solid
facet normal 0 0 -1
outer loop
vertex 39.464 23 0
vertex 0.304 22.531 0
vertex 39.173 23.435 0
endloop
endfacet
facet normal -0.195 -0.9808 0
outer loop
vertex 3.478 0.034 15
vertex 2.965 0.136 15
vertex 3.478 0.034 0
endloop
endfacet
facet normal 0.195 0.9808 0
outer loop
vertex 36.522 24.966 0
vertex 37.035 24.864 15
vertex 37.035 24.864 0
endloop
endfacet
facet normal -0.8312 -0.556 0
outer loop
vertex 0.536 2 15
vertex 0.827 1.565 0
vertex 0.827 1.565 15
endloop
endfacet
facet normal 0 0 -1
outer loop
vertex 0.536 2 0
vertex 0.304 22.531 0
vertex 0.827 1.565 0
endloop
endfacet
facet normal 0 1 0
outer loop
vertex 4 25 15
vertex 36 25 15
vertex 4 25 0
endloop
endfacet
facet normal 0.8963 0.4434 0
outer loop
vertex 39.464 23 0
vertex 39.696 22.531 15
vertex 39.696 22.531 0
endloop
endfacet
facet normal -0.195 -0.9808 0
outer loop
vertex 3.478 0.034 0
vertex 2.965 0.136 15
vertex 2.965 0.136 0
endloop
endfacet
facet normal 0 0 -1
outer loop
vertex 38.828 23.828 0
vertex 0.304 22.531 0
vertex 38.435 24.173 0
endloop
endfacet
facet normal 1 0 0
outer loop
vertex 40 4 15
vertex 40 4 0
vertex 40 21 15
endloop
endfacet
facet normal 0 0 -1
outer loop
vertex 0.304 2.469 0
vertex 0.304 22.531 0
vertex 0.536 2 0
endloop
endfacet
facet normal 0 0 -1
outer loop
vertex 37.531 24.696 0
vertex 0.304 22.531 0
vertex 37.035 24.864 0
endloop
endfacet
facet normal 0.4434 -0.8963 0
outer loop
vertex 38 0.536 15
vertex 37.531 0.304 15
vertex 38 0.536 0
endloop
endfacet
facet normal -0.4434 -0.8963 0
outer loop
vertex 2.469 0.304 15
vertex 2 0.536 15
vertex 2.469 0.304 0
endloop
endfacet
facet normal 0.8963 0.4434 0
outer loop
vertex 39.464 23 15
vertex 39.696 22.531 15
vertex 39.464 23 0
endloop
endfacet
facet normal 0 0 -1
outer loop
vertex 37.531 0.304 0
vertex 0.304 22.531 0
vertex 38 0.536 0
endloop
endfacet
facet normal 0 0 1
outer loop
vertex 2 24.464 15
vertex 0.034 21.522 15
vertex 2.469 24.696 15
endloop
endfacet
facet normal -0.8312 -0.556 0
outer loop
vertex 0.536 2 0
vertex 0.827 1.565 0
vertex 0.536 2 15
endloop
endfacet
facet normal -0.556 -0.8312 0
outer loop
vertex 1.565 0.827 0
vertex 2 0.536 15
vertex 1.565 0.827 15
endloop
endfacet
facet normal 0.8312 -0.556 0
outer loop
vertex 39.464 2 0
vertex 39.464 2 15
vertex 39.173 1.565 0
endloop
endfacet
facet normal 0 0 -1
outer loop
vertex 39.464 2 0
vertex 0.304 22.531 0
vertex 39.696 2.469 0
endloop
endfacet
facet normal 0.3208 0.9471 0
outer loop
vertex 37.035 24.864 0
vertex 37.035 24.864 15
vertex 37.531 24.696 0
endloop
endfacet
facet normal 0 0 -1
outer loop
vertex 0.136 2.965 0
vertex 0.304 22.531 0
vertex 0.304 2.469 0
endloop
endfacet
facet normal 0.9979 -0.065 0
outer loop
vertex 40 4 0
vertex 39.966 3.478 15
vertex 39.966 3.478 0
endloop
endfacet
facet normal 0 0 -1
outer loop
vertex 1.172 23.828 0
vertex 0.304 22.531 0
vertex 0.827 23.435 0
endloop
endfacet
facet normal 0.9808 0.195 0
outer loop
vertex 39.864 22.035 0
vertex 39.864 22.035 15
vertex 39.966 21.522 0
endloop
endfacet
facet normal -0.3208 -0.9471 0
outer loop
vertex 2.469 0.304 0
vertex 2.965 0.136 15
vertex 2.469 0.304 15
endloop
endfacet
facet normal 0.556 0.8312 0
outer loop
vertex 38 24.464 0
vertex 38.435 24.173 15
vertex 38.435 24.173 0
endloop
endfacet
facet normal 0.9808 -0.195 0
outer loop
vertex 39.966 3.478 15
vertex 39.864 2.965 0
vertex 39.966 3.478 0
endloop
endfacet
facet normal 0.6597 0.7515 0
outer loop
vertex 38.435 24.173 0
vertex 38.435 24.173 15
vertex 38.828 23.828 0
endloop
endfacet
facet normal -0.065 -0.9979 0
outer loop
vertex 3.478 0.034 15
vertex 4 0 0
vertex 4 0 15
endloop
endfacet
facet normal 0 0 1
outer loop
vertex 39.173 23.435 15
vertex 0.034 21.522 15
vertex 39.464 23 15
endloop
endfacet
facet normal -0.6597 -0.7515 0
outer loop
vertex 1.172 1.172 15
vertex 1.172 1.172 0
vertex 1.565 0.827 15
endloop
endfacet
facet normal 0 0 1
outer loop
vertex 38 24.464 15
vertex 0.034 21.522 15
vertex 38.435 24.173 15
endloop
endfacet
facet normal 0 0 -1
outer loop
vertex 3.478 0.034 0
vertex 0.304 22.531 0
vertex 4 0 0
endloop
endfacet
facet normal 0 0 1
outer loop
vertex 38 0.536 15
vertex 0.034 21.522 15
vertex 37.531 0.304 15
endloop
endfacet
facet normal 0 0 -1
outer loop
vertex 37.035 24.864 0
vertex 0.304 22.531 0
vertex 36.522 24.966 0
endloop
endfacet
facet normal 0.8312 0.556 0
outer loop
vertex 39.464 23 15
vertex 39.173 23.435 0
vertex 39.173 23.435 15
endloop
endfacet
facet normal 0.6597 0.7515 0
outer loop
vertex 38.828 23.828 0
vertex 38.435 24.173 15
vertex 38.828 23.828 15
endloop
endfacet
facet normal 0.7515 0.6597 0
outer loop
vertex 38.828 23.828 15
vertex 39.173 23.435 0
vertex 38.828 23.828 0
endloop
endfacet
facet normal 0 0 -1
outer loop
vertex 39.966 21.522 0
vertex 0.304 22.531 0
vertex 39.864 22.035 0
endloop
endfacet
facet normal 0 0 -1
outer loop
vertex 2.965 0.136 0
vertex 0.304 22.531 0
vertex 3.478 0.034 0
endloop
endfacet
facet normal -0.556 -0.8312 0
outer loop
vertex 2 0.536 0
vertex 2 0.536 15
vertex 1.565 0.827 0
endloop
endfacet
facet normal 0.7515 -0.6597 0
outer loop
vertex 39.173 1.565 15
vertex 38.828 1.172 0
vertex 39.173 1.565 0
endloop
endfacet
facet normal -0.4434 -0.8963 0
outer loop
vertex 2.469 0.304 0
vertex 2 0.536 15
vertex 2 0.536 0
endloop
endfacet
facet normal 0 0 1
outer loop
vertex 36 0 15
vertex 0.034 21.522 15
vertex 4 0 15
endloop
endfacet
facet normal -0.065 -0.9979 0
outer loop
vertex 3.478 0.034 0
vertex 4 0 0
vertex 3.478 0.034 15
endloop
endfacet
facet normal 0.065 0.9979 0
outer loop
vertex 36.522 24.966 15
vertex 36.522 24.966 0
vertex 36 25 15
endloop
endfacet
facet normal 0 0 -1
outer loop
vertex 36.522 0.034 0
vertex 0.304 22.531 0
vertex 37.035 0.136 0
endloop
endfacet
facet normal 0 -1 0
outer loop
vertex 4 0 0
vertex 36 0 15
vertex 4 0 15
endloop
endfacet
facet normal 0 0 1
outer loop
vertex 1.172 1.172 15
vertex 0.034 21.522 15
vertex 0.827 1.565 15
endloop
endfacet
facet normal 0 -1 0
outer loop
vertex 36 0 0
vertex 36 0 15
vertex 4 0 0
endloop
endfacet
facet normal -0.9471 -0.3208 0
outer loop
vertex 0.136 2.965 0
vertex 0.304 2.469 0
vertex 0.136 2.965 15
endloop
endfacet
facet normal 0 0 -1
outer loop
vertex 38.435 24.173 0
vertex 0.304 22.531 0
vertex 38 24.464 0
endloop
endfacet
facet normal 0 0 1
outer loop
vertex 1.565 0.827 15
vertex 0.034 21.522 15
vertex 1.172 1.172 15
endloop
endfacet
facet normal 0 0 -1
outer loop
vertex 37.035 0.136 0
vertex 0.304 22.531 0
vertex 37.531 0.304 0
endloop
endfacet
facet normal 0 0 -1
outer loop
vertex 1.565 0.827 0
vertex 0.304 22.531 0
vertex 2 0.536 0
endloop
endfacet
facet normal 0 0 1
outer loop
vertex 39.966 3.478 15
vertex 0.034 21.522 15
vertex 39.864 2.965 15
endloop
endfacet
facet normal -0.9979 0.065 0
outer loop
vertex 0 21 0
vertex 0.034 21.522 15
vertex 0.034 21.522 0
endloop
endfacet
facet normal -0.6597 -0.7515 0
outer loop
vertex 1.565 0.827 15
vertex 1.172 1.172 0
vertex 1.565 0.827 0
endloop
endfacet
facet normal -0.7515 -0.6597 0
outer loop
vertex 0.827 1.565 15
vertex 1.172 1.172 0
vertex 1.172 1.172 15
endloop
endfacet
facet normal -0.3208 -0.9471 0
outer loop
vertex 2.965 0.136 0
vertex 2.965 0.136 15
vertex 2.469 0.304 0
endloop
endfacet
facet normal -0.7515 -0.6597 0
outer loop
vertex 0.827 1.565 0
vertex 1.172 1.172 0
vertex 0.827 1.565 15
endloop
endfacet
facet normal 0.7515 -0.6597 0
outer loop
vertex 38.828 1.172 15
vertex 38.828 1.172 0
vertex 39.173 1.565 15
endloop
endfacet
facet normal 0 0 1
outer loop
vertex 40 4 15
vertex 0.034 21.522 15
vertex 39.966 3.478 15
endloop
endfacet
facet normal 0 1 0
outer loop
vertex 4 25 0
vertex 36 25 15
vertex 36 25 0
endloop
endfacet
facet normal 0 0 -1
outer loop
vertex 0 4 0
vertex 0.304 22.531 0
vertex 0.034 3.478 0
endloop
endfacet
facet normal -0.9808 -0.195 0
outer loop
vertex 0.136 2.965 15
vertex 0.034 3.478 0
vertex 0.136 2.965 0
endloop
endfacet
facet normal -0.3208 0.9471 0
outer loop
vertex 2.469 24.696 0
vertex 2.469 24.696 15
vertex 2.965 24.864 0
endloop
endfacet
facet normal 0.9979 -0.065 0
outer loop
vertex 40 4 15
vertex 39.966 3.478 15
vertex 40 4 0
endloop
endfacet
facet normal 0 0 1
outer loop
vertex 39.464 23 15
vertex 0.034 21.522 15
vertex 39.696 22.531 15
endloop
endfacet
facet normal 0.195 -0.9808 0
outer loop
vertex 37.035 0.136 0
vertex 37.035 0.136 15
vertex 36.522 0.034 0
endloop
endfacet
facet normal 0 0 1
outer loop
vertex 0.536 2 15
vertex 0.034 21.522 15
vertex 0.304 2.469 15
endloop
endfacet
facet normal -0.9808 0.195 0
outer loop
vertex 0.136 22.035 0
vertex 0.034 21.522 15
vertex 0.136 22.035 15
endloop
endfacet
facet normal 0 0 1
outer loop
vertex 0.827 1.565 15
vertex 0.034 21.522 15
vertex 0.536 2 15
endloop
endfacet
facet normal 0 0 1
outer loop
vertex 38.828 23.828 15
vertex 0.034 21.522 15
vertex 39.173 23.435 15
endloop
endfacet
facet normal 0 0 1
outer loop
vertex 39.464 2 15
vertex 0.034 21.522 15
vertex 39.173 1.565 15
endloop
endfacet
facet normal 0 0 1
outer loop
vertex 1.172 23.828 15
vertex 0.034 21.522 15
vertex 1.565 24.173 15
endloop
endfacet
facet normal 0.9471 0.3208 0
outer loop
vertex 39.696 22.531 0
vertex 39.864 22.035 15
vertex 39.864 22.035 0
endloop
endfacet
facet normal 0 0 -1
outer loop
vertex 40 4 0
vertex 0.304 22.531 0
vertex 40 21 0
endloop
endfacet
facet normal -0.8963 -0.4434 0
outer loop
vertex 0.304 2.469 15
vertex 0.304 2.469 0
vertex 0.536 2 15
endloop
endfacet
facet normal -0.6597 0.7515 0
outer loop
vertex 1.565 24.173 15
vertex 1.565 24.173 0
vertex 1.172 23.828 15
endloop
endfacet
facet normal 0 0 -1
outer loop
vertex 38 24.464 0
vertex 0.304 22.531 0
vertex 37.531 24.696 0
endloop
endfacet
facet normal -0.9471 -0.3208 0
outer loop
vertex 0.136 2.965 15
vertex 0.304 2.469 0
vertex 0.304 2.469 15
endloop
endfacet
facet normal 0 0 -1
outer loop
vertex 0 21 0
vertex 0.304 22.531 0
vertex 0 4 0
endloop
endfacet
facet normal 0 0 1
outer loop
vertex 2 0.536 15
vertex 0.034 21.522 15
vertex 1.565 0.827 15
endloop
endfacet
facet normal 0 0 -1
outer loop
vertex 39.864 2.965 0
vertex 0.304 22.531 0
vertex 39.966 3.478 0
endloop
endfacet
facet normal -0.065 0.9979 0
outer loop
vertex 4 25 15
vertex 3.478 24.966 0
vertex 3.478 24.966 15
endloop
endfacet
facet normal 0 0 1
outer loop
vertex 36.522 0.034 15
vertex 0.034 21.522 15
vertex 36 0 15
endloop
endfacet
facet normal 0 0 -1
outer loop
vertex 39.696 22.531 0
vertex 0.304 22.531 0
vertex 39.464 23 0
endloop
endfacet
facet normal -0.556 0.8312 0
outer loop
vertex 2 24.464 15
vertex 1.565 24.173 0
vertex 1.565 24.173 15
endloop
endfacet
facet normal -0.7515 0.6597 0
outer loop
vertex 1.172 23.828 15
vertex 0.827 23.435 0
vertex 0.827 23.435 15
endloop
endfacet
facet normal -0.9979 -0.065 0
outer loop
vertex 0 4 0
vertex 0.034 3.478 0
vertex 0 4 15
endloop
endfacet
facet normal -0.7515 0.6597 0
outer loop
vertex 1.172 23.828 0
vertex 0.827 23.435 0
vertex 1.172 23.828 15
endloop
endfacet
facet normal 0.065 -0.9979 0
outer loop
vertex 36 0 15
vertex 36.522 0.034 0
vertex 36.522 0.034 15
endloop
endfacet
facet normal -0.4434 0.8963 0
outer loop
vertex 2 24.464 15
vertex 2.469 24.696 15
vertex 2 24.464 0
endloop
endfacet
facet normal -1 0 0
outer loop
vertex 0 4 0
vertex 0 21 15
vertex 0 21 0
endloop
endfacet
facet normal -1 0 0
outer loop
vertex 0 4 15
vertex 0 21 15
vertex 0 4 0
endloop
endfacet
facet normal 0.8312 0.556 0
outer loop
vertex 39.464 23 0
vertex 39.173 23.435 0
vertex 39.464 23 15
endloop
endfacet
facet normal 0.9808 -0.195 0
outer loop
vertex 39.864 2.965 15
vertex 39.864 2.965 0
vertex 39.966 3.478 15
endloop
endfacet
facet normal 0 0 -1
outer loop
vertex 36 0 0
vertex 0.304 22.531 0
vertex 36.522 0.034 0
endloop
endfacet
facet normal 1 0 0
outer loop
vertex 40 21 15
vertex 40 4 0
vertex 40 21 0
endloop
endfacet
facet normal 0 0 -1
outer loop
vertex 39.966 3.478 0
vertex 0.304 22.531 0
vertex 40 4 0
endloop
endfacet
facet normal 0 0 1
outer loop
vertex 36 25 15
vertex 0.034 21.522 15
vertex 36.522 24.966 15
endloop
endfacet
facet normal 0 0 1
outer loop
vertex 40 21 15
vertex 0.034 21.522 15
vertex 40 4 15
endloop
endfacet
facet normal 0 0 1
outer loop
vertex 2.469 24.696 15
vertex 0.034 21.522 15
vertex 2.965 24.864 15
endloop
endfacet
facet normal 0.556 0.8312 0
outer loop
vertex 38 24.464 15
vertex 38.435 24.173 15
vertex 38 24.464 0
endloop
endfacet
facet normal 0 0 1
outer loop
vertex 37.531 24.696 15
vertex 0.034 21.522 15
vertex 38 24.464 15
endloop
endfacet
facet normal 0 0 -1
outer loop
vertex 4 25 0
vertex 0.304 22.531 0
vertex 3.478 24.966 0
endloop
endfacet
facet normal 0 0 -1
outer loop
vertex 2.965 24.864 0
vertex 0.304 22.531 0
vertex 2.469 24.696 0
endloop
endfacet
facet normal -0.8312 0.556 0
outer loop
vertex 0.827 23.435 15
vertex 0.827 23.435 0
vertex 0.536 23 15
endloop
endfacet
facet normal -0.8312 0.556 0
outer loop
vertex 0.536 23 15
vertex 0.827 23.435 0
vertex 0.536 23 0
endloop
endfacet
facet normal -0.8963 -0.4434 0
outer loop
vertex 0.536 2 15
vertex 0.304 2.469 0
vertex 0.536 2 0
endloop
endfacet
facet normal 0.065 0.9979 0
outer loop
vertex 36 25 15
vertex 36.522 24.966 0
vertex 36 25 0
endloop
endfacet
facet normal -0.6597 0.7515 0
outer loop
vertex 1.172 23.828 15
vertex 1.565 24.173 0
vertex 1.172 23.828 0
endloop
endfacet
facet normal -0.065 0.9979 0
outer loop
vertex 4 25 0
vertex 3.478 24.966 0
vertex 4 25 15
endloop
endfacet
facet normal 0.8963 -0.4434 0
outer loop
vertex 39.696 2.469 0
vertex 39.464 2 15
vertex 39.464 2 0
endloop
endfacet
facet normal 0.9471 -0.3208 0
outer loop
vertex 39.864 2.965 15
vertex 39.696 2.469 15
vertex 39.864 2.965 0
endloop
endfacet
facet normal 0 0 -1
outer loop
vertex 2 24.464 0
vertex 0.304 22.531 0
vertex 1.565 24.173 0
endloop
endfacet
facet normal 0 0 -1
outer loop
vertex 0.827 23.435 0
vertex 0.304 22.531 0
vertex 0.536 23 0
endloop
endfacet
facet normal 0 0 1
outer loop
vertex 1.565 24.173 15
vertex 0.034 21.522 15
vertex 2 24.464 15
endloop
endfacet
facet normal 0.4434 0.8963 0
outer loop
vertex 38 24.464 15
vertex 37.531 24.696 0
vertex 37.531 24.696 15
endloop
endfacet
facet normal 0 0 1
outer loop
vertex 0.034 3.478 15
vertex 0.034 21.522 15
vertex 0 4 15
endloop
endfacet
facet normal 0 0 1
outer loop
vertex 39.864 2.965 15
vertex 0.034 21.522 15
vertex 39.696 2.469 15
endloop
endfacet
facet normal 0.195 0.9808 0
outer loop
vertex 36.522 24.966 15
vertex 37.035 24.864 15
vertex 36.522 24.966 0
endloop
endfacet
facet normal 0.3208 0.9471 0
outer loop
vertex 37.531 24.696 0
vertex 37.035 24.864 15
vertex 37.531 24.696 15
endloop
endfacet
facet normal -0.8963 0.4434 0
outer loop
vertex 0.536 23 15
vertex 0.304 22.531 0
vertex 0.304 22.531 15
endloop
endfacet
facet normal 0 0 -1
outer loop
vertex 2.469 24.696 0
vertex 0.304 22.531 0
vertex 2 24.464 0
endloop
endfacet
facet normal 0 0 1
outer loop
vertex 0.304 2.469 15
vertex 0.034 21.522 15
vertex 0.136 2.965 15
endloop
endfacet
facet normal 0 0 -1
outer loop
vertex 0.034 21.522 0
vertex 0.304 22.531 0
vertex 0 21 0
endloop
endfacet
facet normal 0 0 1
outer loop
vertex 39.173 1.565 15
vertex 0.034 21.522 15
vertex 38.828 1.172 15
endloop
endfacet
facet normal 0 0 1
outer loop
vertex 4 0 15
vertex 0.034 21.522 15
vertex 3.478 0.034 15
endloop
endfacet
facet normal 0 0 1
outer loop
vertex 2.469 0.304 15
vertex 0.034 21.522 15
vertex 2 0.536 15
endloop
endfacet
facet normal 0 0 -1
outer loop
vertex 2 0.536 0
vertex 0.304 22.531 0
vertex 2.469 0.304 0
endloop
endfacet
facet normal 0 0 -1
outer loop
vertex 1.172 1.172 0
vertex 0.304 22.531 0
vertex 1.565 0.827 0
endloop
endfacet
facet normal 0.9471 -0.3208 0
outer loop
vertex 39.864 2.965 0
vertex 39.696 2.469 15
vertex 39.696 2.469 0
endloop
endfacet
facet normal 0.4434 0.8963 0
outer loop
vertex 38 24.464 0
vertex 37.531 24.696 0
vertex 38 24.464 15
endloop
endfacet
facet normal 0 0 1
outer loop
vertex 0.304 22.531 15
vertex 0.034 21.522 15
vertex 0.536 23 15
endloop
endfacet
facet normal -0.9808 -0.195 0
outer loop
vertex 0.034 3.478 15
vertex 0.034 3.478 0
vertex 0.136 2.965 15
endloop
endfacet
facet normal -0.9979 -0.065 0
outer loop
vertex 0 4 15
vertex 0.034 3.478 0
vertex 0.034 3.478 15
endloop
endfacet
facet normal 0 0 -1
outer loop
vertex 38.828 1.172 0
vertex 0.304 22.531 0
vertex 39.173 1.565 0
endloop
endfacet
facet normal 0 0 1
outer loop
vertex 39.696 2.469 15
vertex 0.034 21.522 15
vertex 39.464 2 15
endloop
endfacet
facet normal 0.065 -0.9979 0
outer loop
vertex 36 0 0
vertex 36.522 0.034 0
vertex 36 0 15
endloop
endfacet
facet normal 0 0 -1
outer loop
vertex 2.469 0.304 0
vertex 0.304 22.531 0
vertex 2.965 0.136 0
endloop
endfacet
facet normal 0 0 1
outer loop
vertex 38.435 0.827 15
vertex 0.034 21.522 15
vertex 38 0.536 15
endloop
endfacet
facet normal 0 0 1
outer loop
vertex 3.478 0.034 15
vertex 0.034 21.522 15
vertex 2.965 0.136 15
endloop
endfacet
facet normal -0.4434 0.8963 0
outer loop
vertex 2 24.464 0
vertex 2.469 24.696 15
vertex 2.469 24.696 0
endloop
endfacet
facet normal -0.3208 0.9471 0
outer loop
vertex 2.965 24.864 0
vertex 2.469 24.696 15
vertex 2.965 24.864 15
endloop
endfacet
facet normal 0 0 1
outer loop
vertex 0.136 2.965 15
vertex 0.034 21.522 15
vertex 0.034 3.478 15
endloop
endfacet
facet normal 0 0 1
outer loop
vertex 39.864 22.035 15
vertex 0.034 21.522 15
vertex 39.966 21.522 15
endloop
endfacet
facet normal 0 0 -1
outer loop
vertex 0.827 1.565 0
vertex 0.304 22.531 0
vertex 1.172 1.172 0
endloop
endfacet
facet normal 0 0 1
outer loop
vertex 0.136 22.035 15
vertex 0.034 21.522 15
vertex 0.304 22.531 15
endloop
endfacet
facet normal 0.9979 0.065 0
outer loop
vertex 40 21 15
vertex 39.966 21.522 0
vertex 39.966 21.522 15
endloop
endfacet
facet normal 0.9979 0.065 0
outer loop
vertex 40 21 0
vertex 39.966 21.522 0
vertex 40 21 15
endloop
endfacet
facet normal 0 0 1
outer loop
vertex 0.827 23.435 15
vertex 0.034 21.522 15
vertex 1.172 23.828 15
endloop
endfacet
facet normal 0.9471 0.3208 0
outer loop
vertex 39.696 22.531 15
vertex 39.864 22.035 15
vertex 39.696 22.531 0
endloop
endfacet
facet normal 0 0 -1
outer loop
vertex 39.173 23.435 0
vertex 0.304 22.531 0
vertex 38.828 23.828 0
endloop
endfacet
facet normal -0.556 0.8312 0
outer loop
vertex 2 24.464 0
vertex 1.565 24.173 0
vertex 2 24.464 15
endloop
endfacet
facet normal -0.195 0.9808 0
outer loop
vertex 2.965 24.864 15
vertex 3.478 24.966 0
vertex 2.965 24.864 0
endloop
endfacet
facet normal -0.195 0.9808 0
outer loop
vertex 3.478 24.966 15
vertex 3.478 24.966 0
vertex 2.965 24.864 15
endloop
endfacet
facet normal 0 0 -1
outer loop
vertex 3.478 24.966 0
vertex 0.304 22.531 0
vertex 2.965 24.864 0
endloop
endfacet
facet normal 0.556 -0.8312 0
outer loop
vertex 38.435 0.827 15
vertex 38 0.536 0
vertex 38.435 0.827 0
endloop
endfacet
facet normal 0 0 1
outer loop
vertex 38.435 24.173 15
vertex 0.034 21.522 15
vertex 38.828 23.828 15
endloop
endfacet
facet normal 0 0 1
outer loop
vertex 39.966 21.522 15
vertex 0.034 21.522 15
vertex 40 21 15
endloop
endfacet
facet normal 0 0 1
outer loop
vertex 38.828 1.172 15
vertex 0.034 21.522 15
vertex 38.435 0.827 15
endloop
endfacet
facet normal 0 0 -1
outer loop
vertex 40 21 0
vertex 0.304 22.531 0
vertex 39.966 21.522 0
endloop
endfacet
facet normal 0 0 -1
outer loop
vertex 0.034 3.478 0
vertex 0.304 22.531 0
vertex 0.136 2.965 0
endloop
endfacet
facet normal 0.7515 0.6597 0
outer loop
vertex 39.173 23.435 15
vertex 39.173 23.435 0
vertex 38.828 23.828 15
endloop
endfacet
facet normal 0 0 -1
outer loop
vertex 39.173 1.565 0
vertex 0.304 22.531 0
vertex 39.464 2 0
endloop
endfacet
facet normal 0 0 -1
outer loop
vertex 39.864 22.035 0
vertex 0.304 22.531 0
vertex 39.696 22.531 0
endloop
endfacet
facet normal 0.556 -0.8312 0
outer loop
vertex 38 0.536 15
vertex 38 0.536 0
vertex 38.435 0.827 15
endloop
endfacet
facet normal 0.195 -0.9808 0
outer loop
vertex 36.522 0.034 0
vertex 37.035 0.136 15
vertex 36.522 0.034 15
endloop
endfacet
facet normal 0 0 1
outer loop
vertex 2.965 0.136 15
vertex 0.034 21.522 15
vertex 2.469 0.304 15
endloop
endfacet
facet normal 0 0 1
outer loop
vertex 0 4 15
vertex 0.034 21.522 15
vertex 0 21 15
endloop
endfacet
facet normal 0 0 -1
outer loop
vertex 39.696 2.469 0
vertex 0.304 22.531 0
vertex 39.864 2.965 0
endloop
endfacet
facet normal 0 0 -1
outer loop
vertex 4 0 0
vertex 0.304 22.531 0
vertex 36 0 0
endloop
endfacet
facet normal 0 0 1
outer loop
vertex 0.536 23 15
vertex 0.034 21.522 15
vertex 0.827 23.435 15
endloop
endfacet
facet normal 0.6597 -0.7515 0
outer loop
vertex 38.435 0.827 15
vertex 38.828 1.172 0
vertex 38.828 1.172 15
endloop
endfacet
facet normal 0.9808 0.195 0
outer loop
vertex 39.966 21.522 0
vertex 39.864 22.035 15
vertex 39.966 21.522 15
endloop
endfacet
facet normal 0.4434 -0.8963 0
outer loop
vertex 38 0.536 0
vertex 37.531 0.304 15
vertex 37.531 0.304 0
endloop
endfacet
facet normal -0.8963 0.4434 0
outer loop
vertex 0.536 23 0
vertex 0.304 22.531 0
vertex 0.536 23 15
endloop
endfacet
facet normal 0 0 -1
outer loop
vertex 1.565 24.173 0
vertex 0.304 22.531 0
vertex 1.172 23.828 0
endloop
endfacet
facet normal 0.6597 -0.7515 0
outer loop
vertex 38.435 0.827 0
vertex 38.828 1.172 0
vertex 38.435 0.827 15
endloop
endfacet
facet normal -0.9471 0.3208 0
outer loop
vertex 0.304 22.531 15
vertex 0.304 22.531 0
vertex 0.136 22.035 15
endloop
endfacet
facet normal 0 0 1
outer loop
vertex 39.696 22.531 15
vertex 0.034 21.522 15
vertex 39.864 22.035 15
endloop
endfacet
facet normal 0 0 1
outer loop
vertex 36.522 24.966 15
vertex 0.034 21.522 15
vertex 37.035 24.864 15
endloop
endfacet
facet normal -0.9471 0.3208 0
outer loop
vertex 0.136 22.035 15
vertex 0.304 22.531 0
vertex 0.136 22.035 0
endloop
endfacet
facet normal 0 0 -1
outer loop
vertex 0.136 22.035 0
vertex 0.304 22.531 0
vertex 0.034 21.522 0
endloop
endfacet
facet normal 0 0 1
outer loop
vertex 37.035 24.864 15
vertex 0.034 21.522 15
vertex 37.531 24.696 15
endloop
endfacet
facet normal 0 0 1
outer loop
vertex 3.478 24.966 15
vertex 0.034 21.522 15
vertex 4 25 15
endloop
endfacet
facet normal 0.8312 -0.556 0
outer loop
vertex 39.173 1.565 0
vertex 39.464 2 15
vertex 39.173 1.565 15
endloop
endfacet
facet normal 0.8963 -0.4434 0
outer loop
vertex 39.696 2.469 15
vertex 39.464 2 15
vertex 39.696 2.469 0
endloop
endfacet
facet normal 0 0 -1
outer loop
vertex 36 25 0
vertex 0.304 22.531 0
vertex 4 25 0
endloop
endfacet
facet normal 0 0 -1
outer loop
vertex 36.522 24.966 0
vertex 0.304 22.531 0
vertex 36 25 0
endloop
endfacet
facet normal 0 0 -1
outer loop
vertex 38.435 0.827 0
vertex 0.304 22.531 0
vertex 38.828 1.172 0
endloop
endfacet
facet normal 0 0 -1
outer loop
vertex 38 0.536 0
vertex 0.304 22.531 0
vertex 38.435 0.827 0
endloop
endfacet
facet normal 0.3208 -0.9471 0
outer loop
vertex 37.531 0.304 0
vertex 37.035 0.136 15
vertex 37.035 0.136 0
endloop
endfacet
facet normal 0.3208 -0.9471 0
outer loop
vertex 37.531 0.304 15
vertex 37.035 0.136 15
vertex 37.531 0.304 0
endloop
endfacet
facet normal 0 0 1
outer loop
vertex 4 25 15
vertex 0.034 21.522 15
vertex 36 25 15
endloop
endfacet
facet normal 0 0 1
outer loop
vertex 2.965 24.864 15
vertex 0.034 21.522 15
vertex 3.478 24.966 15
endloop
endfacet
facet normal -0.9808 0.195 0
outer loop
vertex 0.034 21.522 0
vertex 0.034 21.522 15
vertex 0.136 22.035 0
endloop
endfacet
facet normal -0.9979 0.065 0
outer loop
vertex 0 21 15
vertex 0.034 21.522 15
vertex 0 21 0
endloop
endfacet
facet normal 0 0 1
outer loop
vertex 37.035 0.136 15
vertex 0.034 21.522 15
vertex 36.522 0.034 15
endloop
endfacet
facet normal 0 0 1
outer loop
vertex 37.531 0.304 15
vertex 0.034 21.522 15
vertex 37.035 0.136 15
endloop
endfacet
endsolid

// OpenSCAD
// Parametric demo model for the OpenSCAD docs template.
//
// docs-site.yml names this file in models:, so the engine puts it on this
// site's Model page as a 3D view with a live customizer. A page could embed it
// with {% include openscad.html model="model-models-demo" %}.
//
// The annotations below (group headers and value ranges) drive the in-browser
// customizer panel.

/* [Box] */
// Length (mm)
length = 40; // [10:100]
// Width (mm)
width = 25; // [10:100]
// Height (mm)
height = 15; // [5:50]

/* [Rounding] */
// Corner radius (mm)
radius = 4; // [0:0.5:20]
// Facets (smoothness)
facets = 48; // [12:4:120]

$fn = facets;

module rounded_box(l, w, h, r) {
  hull()
    for (x = [r, l - r], y = [r, w - r])
      translate([x, y, 0]) cylinder(h = h, r = r);
}

rounded_box(length, width, height, radius);
